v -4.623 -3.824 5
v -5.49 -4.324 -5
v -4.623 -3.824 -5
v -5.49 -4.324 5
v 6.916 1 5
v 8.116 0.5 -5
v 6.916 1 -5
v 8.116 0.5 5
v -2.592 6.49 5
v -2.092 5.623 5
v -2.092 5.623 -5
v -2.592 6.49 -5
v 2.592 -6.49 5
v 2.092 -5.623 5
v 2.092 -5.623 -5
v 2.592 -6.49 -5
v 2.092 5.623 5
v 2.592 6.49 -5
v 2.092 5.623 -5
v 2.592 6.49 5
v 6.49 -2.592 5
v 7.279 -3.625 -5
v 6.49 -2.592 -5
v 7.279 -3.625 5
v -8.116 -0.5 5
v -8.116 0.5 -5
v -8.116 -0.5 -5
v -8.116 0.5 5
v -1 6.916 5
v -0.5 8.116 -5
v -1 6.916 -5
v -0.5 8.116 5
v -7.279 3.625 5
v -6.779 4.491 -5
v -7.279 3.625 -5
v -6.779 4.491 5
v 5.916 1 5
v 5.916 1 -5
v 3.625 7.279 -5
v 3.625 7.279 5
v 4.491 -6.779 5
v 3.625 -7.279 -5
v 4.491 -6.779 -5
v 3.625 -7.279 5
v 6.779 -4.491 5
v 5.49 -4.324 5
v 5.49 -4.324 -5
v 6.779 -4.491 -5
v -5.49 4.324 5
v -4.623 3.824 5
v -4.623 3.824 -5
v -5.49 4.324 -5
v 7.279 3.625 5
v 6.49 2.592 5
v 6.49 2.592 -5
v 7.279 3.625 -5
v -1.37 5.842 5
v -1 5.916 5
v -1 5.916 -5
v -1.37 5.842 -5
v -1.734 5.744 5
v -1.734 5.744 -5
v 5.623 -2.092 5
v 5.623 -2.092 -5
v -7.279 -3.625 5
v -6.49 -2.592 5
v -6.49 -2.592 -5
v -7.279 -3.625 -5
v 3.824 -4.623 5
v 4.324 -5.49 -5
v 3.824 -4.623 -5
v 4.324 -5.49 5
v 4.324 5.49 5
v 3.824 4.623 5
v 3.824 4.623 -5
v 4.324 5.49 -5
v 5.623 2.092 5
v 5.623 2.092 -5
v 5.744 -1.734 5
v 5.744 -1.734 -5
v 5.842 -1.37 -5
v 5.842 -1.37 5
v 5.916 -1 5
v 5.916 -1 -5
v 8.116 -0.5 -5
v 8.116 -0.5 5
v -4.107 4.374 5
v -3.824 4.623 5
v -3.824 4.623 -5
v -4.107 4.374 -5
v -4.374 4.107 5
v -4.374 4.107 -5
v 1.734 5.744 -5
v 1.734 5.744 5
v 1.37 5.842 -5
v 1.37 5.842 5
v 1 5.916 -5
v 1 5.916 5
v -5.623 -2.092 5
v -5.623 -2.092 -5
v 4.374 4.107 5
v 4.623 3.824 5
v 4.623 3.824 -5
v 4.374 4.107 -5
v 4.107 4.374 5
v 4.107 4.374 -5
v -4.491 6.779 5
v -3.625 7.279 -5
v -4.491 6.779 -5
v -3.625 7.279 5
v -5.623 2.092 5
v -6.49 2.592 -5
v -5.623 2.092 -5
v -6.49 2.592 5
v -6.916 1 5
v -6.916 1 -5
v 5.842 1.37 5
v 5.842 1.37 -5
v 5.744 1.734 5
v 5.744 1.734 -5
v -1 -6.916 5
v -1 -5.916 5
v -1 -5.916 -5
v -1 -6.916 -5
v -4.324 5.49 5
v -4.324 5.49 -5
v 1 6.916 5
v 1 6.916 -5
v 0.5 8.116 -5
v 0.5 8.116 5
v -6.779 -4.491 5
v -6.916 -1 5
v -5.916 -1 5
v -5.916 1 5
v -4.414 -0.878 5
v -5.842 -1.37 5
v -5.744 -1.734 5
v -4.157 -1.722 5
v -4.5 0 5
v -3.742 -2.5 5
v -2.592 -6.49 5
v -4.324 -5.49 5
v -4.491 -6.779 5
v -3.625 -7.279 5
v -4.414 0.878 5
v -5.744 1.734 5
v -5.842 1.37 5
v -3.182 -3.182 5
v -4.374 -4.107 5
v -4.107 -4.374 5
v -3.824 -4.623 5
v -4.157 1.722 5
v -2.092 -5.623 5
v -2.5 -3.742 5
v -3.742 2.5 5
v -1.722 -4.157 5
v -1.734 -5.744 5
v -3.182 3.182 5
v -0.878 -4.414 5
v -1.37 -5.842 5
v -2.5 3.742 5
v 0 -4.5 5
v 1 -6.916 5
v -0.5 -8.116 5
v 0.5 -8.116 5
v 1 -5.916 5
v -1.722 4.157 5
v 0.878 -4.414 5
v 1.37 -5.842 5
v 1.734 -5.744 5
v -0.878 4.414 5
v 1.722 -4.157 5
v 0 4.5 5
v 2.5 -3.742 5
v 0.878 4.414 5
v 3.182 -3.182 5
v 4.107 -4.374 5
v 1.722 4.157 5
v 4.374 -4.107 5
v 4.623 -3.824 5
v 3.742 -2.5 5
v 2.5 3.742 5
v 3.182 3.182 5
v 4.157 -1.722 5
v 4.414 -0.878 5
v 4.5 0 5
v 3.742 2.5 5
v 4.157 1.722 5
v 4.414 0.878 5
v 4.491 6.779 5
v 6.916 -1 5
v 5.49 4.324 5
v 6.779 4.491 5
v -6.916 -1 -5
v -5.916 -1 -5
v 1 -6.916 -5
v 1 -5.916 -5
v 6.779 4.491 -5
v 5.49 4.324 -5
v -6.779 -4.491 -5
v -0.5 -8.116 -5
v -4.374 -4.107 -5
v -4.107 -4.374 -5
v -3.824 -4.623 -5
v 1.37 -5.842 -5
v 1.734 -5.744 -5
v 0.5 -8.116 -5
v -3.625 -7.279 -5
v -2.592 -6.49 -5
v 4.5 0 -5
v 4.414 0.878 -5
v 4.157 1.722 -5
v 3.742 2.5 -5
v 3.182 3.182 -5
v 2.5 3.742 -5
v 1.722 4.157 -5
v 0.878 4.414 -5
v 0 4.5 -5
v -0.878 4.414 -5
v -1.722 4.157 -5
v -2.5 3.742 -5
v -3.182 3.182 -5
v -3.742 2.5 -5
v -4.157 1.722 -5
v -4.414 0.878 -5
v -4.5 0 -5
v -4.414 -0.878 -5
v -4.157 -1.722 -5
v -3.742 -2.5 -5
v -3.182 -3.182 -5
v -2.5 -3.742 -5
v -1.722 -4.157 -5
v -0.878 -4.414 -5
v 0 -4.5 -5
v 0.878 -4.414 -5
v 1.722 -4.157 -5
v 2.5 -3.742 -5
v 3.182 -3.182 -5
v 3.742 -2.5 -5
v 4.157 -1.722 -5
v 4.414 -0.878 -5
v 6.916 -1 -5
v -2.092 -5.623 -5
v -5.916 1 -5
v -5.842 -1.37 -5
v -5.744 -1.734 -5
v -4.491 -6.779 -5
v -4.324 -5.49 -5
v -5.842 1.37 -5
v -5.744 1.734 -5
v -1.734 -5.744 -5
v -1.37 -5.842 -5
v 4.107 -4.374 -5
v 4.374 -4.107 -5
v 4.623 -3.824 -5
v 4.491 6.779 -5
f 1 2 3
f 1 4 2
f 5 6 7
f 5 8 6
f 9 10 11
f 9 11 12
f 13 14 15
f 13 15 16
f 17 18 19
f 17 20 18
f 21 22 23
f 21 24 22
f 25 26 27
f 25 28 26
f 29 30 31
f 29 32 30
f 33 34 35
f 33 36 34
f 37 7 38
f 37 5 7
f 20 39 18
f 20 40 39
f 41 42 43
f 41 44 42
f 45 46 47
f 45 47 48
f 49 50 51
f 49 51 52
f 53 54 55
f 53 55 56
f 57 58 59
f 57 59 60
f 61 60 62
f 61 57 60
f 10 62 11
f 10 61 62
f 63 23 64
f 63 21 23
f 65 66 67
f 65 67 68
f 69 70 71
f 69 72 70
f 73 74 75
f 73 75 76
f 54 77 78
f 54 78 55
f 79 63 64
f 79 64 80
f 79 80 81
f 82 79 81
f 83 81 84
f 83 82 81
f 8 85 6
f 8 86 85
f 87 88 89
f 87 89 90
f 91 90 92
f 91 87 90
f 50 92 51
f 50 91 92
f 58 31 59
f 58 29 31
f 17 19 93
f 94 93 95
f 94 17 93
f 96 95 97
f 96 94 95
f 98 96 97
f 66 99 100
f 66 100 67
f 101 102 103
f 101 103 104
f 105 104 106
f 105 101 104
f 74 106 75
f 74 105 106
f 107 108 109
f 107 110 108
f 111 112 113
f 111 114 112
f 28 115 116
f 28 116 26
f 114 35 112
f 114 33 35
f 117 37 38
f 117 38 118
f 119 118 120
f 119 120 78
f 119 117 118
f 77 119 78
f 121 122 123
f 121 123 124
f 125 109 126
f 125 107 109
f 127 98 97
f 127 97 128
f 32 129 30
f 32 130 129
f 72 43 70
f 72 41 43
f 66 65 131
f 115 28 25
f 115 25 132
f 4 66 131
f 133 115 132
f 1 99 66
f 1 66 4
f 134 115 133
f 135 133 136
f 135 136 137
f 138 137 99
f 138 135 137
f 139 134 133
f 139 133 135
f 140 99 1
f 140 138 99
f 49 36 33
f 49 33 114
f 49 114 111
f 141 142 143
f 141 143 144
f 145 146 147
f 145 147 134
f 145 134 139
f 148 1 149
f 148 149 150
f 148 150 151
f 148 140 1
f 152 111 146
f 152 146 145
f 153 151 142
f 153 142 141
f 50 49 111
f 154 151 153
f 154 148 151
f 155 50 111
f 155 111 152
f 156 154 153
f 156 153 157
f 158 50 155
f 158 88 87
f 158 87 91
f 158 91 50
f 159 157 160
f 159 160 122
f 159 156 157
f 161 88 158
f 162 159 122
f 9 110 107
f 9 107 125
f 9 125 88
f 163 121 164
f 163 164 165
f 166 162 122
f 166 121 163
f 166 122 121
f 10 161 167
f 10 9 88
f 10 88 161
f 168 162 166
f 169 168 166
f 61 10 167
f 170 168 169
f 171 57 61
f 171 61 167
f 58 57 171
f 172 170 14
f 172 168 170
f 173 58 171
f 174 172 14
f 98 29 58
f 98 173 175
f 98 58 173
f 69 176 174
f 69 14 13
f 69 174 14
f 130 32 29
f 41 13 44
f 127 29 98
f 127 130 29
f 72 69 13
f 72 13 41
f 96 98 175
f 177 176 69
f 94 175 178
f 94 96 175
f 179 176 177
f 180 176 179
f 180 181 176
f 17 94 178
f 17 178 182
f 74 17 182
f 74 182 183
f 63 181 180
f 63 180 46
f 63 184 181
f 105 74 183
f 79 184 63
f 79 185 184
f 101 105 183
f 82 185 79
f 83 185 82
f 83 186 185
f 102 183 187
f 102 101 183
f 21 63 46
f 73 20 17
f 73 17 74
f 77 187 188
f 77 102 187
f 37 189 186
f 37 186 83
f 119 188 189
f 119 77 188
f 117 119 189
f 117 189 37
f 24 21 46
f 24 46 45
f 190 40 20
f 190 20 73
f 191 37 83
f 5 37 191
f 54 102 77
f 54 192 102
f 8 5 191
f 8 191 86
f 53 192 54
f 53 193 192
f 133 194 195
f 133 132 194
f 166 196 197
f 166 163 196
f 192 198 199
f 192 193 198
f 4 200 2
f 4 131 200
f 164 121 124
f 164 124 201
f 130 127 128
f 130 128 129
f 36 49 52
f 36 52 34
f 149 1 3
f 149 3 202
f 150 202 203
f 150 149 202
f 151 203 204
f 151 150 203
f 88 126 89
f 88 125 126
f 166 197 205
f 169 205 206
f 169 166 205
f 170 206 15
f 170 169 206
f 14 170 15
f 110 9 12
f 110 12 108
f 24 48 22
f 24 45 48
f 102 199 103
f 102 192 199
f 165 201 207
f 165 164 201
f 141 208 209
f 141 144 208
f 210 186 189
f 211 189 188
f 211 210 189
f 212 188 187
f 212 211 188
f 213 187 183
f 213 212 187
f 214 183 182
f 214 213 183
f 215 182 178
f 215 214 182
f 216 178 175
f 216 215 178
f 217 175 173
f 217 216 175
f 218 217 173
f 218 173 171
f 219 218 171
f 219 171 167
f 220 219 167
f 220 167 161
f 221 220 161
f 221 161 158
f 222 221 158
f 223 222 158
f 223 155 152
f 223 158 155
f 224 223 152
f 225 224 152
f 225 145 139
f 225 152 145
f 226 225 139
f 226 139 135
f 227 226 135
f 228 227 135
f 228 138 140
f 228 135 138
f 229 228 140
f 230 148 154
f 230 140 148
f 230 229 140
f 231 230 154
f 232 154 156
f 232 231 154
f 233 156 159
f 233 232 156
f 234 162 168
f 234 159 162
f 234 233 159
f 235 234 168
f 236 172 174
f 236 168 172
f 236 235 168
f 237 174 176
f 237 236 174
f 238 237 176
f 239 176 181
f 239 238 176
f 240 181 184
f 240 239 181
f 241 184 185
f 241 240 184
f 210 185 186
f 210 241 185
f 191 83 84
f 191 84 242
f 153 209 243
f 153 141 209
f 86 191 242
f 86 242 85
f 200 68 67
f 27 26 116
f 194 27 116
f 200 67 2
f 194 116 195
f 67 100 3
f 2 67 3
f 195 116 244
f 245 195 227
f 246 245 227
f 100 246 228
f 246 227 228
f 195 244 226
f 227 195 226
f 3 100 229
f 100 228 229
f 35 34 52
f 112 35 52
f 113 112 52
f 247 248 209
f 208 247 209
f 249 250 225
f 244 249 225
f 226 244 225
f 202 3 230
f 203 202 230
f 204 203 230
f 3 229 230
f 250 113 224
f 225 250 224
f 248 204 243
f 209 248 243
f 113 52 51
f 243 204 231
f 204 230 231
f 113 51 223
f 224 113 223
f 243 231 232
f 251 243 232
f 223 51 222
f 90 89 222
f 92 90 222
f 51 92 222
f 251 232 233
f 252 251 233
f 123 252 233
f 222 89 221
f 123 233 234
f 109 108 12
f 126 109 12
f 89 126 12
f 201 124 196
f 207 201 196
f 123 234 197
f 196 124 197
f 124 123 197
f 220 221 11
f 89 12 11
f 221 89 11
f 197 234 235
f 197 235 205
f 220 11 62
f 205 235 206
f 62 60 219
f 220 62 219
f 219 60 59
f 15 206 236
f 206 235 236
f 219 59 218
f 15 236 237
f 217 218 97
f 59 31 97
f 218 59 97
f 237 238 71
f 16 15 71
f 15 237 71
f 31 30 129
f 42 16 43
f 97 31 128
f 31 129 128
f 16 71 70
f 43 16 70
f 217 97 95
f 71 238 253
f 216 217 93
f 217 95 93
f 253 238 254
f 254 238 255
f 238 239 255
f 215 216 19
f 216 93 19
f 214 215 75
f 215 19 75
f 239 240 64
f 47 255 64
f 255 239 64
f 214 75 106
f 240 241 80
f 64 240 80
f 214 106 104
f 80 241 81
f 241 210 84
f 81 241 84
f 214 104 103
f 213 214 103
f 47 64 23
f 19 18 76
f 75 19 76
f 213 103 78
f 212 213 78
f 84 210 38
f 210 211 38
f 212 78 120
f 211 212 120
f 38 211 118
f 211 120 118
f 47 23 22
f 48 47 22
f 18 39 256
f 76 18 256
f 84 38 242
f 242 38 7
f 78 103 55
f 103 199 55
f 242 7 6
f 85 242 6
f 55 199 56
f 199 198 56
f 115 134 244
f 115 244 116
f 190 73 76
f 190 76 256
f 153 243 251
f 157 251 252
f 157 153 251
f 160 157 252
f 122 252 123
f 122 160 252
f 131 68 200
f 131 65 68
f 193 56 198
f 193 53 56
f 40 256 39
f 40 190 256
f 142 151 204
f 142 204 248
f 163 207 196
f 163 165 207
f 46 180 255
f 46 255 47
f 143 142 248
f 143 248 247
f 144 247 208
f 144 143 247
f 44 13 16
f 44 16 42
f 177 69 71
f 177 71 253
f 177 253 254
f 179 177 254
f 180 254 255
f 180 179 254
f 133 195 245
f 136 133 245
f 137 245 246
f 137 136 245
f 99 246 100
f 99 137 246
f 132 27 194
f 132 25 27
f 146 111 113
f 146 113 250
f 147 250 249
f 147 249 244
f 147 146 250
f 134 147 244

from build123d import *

# Parameters (mm, degrees)
SKETCH1_R           = 4.5
BOSS_EXTRUDE1_DEPTH = 5
CIRPATTERN1_COUNT   = 12


with BuildPart() as part:
    # Sketch1 → Boss-Extrude1 (new body, symmetric)
    with BuildSketch(Plane.XY):
        with BuildLine():
            Line((-1, 6.916079783), (-1, 5.916079783))
            ThreePointArc((-1, 5.916079783), (0, -6), (1, 5.916079783))
            Line((1, 5.916079783), (1, 6.916079783))
            Line((1, 6.916079783), (0.5, 8.116079783))
            Line((0.5, 8.116079783), (-0.5, 8.116079783))
            Line((-0.5, 8.116079783), (-1, 6.916079783))
        make_face()
        Circle(SKETCH1_R, mode=Mode.SUBTRACT)
    boss_extrude1 = extrude(amount=BOSS_EXTRUDE1_DEPTH, both=True)

    # CirPattern1: Boss-Extrude1 ×12 about axis
    cirpattern1_axis = Axis((0, 0, 0), (0, 0, 1))
    for i in range(1, CIRPATTERN1_COUNT):
        add(boss_extrude1.rotate(cirpattern1_axis, i * 360 / CIRPATTERN1_COUNT))


solid = part.part
